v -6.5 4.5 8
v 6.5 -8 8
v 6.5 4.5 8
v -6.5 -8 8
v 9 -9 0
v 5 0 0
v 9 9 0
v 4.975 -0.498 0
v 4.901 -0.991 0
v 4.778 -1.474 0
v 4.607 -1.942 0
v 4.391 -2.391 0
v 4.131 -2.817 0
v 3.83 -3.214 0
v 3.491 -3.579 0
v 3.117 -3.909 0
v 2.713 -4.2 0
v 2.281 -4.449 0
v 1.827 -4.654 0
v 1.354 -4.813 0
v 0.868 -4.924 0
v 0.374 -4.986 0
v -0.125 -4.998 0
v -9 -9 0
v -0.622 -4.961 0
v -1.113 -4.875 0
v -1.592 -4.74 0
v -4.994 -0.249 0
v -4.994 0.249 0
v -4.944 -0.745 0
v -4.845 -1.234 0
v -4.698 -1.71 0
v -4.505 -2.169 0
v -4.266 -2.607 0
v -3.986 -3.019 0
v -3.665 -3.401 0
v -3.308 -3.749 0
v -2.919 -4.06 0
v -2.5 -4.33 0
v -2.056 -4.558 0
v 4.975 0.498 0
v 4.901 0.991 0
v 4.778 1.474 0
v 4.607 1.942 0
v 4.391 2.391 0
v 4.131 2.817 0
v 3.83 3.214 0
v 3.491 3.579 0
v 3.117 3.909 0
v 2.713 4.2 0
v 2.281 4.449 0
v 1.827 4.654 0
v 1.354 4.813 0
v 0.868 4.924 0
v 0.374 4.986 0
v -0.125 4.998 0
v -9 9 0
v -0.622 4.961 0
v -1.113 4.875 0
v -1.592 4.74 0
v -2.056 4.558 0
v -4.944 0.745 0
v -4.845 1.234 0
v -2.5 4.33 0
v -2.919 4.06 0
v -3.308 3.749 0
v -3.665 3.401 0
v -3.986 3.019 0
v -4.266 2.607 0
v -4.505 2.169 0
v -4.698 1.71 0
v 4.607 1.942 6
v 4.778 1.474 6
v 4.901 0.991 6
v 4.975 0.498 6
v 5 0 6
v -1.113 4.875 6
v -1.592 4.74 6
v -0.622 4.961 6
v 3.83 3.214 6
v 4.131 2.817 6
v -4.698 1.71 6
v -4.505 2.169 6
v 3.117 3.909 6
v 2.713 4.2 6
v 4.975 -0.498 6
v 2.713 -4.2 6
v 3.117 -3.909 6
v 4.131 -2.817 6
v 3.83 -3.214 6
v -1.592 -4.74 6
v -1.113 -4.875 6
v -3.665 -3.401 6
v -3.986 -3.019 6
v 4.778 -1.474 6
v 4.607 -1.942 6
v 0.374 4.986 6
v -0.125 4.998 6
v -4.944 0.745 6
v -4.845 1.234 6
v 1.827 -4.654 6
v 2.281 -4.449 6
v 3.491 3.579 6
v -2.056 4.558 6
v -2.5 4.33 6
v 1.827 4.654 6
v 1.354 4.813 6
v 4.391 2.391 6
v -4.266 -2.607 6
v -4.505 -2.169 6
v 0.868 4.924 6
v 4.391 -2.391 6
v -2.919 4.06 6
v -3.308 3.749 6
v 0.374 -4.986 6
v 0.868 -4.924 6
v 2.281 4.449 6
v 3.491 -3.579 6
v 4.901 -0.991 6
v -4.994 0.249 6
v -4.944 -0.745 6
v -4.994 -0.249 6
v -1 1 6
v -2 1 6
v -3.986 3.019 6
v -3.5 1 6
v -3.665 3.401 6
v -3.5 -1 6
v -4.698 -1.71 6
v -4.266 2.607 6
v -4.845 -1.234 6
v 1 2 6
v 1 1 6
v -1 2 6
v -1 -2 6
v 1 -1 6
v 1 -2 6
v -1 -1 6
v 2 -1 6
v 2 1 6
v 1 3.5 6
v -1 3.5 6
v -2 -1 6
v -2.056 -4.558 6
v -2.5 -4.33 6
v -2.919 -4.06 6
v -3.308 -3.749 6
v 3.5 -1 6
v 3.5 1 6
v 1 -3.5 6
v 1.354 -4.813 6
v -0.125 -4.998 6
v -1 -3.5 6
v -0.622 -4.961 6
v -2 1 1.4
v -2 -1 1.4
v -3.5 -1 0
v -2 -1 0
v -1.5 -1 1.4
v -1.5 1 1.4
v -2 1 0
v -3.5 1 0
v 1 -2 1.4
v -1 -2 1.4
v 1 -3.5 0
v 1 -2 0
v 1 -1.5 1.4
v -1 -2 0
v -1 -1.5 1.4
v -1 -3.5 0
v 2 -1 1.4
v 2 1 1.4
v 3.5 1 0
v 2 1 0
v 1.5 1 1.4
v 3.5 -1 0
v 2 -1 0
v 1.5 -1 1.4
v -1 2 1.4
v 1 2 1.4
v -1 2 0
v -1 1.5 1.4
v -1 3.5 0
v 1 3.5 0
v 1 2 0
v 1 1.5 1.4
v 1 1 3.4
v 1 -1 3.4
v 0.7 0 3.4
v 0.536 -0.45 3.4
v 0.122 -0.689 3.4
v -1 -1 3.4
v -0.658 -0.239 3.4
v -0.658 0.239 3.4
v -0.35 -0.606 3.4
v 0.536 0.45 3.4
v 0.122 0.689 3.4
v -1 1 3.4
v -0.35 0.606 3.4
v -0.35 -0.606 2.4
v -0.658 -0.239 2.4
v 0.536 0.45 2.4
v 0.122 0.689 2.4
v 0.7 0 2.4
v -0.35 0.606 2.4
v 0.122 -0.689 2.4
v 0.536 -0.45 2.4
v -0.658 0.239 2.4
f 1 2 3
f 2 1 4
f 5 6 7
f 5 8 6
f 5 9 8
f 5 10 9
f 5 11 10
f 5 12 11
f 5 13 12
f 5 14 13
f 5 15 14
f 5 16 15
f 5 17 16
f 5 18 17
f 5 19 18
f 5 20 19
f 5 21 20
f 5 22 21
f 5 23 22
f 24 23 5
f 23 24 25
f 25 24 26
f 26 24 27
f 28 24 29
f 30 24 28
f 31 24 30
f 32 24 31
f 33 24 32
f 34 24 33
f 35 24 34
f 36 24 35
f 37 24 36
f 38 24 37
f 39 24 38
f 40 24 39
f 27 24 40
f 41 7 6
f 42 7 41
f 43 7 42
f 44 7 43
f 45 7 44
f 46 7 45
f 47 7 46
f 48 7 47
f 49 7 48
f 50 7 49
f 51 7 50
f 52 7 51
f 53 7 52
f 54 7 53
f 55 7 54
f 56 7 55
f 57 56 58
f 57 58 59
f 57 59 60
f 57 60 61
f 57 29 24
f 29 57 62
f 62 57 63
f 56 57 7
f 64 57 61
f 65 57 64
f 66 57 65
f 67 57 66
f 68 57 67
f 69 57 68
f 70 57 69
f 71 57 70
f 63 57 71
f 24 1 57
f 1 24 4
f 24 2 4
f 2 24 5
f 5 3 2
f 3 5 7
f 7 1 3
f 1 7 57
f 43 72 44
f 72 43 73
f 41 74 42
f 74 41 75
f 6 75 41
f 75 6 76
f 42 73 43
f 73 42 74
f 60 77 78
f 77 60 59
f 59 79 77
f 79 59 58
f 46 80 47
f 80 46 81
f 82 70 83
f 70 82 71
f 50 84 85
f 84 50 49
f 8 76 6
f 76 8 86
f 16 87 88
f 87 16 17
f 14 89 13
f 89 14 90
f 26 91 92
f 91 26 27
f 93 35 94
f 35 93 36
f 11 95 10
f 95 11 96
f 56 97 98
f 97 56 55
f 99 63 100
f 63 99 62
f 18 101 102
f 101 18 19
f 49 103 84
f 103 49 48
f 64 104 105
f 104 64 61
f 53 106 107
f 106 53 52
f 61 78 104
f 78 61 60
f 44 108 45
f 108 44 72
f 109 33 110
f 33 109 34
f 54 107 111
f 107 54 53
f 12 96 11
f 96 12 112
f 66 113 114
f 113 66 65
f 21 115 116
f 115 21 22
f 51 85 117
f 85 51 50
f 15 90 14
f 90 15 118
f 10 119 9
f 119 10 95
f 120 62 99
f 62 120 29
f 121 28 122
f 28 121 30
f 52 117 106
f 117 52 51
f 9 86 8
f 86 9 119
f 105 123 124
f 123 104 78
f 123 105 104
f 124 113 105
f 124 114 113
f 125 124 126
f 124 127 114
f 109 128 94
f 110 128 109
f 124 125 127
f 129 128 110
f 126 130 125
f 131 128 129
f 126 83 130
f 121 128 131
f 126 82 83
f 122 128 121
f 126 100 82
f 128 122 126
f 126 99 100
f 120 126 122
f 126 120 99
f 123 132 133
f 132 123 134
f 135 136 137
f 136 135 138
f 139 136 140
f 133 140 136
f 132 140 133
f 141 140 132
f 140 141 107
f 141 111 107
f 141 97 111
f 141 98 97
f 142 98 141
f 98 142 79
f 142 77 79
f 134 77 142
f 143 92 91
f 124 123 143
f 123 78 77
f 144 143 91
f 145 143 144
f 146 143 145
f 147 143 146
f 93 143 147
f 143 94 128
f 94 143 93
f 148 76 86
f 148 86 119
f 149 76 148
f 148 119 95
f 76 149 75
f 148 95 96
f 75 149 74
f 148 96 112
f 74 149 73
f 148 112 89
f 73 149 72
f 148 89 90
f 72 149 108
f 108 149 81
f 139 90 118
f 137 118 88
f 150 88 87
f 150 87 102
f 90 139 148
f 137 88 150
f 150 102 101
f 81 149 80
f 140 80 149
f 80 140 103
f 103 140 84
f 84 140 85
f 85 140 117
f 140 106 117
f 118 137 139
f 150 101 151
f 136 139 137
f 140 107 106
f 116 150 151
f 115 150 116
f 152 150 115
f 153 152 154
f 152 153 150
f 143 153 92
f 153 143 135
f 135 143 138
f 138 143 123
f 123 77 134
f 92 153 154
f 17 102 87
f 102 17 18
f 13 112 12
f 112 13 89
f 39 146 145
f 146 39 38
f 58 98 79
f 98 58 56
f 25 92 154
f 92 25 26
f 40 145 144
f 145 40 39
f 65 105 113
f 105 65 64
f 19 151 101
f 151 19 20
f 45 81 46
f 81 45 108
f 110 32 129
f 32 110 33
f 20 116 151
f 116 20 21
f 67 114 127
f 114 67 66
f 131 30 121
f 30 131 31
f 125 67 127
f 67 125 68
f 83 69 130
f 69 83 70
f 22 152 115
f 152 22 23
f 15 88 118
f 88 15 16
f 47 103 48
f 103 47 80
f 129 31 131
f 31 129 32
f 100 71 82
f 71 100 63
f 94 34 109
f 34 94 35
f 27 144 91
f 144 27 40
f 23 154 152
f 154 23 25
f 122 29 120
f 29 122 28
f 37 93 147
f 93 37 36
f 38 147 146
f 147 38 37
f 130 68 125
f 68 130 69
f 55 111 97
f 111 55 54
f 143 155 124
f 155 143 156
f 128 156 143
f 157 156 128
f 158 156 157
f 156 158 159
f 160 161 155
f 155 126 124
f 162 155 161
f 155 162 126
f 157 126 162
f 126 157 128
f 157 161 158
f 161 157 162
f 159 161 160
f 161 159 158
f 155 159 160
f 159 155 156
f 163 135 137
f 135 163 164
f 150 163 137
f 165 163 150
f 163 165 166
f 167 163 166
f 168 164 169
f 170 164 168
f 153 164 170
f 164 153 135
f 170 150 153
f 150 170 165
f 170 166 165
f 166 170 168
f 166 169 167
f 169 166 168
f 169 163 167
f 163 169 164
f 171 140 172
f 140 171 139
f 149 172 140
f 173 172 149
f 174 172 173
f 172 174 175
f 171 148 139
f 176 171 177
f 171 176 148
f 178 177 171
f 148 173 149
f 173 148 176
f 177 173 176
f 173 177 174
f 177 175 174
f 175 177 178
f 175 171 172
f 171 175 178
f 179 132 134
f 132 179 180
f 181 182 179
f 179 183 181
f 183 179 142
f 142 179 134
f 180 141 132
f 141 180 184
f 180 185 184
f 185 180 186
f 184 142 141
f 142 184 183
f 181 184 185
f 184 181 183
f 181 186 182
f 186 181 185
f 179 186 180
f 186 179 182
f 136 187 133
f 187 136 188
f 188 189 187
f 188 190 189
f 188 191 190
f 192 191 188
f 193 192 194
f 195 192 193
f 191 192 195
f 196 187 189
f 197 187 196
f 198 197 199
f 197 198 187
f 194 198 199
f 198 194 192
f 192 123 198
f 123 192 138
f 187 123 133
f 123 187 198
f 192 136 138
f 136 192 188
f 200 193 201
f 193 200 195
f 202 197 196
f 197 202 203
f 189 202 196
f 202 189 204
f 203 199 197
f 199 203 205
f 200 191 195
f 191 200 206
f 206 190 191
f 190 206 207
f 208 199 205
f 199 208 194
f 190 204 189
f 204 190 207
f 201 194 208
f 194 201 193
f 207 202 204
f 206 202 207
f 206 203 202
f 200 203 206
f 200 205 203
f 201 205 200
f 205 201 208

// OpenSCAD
// file: proto_1/button_clips.scad
$fs=0.5;

color("darkorange",0.5) button_dock();
color("springgreen") button_clips();
color("red",0.5) button_clip_cavity();

//dock measurements
top_height = 1.8;
shaft_height = 1.4;
dock_height = top_height + shaft_height;
hole_radius = 0.8;
hole_depth = 1;
base_radius = 3.5;
module button_dock(){
	difference(){
		union(){
			translate([-2,-2,shaft_height])
				cube([4,4,top_height]);
			translate([-1.5,-1.5,0])
				cube([3,3,dock_height]);
			translate([0,0,-2])
				cylinder(h=2, r=base_radius);
		}
		translate([0,0,dock_height-hole_depth+0.1]) 
			cylinder(h=hole_depth, r=hole_radius);
	}
}

clip_width = 2;
clip_thick = 1.5;
clip_height = 7;
module button_clip(){
	translate([-(2+clip_thick),clip_width/2,0])
	rotate([90,0,0])
	union(){
		cube([clip_thick ,clip_height, clip_width]);
		linear_extrude(height=clip_width)
		polygon(
			points=[
				[0,0],
				[0,shaft_height],
				[clip_thick+0.5, shaft_height],
				[clip_thick,0]
			],
			paths=[
				[0,1,2,3]
			]
		);
	}
}

module middle_pin(){
	translate([-1,-1,dock_height+0.2]) cube([2,2,clip_height-dock_height-0.2]);
	translate([0,0,dock_height-hole_depth+0.2]) cylinder(h=hole_depth+0.2, r=hole_radius-0.1);
}

module button_clips(){
	rotate([0,0,0]) button_clip();
	rotate([0,0,90]) button_clip();
	rotate([0,0,180]) button_clip();
	rotate([0,0,270]) button_clip();
	middle_pin();
}

module button_clip_cavity(){
	translate([0,0,-1]) cylinder(h=clip_height, r=5);
}
// main file
$fa=0.2;
//use <key_model/Key_model.scad>;
use <proto_1/button_clips.scad>;

color("seagreen", 0.5)
union(){
	difference(){
		key_body_primitive();
		union(){
			button_clip_cavity();
			//translate([0,25,27]) rotate([90,0,0]) cylinder(h=50, r=20);
		}
	}
	button_clips();
}

module key_body_primitive(){
	polyhedron(
		points=[
			[ 9, 9, 0],	//lower points
			[ 9,-9, 0],
			[-9,-9, 0],
			[-9, 9, 0],
			
			[6.5, 4.5, 8],	//higher points
			[6.5, -8, 8],
			[-6.5, -8, 8],
			[-6.5, 4.5, 8]
		],
		triangles=[
			[1,0,2],	//bottom
			[3,2,0],
			[4,5,6],	//top
			[6,7,4],
	
			[0,5,4],	//east
			[0,1,5],
			[1,6,5],	//south
			[1,2,6],
			[2,7,6],	//west
			[2,3,7],
			[3,4,7],	//north
			[3,0,4]
		]
	);
}
